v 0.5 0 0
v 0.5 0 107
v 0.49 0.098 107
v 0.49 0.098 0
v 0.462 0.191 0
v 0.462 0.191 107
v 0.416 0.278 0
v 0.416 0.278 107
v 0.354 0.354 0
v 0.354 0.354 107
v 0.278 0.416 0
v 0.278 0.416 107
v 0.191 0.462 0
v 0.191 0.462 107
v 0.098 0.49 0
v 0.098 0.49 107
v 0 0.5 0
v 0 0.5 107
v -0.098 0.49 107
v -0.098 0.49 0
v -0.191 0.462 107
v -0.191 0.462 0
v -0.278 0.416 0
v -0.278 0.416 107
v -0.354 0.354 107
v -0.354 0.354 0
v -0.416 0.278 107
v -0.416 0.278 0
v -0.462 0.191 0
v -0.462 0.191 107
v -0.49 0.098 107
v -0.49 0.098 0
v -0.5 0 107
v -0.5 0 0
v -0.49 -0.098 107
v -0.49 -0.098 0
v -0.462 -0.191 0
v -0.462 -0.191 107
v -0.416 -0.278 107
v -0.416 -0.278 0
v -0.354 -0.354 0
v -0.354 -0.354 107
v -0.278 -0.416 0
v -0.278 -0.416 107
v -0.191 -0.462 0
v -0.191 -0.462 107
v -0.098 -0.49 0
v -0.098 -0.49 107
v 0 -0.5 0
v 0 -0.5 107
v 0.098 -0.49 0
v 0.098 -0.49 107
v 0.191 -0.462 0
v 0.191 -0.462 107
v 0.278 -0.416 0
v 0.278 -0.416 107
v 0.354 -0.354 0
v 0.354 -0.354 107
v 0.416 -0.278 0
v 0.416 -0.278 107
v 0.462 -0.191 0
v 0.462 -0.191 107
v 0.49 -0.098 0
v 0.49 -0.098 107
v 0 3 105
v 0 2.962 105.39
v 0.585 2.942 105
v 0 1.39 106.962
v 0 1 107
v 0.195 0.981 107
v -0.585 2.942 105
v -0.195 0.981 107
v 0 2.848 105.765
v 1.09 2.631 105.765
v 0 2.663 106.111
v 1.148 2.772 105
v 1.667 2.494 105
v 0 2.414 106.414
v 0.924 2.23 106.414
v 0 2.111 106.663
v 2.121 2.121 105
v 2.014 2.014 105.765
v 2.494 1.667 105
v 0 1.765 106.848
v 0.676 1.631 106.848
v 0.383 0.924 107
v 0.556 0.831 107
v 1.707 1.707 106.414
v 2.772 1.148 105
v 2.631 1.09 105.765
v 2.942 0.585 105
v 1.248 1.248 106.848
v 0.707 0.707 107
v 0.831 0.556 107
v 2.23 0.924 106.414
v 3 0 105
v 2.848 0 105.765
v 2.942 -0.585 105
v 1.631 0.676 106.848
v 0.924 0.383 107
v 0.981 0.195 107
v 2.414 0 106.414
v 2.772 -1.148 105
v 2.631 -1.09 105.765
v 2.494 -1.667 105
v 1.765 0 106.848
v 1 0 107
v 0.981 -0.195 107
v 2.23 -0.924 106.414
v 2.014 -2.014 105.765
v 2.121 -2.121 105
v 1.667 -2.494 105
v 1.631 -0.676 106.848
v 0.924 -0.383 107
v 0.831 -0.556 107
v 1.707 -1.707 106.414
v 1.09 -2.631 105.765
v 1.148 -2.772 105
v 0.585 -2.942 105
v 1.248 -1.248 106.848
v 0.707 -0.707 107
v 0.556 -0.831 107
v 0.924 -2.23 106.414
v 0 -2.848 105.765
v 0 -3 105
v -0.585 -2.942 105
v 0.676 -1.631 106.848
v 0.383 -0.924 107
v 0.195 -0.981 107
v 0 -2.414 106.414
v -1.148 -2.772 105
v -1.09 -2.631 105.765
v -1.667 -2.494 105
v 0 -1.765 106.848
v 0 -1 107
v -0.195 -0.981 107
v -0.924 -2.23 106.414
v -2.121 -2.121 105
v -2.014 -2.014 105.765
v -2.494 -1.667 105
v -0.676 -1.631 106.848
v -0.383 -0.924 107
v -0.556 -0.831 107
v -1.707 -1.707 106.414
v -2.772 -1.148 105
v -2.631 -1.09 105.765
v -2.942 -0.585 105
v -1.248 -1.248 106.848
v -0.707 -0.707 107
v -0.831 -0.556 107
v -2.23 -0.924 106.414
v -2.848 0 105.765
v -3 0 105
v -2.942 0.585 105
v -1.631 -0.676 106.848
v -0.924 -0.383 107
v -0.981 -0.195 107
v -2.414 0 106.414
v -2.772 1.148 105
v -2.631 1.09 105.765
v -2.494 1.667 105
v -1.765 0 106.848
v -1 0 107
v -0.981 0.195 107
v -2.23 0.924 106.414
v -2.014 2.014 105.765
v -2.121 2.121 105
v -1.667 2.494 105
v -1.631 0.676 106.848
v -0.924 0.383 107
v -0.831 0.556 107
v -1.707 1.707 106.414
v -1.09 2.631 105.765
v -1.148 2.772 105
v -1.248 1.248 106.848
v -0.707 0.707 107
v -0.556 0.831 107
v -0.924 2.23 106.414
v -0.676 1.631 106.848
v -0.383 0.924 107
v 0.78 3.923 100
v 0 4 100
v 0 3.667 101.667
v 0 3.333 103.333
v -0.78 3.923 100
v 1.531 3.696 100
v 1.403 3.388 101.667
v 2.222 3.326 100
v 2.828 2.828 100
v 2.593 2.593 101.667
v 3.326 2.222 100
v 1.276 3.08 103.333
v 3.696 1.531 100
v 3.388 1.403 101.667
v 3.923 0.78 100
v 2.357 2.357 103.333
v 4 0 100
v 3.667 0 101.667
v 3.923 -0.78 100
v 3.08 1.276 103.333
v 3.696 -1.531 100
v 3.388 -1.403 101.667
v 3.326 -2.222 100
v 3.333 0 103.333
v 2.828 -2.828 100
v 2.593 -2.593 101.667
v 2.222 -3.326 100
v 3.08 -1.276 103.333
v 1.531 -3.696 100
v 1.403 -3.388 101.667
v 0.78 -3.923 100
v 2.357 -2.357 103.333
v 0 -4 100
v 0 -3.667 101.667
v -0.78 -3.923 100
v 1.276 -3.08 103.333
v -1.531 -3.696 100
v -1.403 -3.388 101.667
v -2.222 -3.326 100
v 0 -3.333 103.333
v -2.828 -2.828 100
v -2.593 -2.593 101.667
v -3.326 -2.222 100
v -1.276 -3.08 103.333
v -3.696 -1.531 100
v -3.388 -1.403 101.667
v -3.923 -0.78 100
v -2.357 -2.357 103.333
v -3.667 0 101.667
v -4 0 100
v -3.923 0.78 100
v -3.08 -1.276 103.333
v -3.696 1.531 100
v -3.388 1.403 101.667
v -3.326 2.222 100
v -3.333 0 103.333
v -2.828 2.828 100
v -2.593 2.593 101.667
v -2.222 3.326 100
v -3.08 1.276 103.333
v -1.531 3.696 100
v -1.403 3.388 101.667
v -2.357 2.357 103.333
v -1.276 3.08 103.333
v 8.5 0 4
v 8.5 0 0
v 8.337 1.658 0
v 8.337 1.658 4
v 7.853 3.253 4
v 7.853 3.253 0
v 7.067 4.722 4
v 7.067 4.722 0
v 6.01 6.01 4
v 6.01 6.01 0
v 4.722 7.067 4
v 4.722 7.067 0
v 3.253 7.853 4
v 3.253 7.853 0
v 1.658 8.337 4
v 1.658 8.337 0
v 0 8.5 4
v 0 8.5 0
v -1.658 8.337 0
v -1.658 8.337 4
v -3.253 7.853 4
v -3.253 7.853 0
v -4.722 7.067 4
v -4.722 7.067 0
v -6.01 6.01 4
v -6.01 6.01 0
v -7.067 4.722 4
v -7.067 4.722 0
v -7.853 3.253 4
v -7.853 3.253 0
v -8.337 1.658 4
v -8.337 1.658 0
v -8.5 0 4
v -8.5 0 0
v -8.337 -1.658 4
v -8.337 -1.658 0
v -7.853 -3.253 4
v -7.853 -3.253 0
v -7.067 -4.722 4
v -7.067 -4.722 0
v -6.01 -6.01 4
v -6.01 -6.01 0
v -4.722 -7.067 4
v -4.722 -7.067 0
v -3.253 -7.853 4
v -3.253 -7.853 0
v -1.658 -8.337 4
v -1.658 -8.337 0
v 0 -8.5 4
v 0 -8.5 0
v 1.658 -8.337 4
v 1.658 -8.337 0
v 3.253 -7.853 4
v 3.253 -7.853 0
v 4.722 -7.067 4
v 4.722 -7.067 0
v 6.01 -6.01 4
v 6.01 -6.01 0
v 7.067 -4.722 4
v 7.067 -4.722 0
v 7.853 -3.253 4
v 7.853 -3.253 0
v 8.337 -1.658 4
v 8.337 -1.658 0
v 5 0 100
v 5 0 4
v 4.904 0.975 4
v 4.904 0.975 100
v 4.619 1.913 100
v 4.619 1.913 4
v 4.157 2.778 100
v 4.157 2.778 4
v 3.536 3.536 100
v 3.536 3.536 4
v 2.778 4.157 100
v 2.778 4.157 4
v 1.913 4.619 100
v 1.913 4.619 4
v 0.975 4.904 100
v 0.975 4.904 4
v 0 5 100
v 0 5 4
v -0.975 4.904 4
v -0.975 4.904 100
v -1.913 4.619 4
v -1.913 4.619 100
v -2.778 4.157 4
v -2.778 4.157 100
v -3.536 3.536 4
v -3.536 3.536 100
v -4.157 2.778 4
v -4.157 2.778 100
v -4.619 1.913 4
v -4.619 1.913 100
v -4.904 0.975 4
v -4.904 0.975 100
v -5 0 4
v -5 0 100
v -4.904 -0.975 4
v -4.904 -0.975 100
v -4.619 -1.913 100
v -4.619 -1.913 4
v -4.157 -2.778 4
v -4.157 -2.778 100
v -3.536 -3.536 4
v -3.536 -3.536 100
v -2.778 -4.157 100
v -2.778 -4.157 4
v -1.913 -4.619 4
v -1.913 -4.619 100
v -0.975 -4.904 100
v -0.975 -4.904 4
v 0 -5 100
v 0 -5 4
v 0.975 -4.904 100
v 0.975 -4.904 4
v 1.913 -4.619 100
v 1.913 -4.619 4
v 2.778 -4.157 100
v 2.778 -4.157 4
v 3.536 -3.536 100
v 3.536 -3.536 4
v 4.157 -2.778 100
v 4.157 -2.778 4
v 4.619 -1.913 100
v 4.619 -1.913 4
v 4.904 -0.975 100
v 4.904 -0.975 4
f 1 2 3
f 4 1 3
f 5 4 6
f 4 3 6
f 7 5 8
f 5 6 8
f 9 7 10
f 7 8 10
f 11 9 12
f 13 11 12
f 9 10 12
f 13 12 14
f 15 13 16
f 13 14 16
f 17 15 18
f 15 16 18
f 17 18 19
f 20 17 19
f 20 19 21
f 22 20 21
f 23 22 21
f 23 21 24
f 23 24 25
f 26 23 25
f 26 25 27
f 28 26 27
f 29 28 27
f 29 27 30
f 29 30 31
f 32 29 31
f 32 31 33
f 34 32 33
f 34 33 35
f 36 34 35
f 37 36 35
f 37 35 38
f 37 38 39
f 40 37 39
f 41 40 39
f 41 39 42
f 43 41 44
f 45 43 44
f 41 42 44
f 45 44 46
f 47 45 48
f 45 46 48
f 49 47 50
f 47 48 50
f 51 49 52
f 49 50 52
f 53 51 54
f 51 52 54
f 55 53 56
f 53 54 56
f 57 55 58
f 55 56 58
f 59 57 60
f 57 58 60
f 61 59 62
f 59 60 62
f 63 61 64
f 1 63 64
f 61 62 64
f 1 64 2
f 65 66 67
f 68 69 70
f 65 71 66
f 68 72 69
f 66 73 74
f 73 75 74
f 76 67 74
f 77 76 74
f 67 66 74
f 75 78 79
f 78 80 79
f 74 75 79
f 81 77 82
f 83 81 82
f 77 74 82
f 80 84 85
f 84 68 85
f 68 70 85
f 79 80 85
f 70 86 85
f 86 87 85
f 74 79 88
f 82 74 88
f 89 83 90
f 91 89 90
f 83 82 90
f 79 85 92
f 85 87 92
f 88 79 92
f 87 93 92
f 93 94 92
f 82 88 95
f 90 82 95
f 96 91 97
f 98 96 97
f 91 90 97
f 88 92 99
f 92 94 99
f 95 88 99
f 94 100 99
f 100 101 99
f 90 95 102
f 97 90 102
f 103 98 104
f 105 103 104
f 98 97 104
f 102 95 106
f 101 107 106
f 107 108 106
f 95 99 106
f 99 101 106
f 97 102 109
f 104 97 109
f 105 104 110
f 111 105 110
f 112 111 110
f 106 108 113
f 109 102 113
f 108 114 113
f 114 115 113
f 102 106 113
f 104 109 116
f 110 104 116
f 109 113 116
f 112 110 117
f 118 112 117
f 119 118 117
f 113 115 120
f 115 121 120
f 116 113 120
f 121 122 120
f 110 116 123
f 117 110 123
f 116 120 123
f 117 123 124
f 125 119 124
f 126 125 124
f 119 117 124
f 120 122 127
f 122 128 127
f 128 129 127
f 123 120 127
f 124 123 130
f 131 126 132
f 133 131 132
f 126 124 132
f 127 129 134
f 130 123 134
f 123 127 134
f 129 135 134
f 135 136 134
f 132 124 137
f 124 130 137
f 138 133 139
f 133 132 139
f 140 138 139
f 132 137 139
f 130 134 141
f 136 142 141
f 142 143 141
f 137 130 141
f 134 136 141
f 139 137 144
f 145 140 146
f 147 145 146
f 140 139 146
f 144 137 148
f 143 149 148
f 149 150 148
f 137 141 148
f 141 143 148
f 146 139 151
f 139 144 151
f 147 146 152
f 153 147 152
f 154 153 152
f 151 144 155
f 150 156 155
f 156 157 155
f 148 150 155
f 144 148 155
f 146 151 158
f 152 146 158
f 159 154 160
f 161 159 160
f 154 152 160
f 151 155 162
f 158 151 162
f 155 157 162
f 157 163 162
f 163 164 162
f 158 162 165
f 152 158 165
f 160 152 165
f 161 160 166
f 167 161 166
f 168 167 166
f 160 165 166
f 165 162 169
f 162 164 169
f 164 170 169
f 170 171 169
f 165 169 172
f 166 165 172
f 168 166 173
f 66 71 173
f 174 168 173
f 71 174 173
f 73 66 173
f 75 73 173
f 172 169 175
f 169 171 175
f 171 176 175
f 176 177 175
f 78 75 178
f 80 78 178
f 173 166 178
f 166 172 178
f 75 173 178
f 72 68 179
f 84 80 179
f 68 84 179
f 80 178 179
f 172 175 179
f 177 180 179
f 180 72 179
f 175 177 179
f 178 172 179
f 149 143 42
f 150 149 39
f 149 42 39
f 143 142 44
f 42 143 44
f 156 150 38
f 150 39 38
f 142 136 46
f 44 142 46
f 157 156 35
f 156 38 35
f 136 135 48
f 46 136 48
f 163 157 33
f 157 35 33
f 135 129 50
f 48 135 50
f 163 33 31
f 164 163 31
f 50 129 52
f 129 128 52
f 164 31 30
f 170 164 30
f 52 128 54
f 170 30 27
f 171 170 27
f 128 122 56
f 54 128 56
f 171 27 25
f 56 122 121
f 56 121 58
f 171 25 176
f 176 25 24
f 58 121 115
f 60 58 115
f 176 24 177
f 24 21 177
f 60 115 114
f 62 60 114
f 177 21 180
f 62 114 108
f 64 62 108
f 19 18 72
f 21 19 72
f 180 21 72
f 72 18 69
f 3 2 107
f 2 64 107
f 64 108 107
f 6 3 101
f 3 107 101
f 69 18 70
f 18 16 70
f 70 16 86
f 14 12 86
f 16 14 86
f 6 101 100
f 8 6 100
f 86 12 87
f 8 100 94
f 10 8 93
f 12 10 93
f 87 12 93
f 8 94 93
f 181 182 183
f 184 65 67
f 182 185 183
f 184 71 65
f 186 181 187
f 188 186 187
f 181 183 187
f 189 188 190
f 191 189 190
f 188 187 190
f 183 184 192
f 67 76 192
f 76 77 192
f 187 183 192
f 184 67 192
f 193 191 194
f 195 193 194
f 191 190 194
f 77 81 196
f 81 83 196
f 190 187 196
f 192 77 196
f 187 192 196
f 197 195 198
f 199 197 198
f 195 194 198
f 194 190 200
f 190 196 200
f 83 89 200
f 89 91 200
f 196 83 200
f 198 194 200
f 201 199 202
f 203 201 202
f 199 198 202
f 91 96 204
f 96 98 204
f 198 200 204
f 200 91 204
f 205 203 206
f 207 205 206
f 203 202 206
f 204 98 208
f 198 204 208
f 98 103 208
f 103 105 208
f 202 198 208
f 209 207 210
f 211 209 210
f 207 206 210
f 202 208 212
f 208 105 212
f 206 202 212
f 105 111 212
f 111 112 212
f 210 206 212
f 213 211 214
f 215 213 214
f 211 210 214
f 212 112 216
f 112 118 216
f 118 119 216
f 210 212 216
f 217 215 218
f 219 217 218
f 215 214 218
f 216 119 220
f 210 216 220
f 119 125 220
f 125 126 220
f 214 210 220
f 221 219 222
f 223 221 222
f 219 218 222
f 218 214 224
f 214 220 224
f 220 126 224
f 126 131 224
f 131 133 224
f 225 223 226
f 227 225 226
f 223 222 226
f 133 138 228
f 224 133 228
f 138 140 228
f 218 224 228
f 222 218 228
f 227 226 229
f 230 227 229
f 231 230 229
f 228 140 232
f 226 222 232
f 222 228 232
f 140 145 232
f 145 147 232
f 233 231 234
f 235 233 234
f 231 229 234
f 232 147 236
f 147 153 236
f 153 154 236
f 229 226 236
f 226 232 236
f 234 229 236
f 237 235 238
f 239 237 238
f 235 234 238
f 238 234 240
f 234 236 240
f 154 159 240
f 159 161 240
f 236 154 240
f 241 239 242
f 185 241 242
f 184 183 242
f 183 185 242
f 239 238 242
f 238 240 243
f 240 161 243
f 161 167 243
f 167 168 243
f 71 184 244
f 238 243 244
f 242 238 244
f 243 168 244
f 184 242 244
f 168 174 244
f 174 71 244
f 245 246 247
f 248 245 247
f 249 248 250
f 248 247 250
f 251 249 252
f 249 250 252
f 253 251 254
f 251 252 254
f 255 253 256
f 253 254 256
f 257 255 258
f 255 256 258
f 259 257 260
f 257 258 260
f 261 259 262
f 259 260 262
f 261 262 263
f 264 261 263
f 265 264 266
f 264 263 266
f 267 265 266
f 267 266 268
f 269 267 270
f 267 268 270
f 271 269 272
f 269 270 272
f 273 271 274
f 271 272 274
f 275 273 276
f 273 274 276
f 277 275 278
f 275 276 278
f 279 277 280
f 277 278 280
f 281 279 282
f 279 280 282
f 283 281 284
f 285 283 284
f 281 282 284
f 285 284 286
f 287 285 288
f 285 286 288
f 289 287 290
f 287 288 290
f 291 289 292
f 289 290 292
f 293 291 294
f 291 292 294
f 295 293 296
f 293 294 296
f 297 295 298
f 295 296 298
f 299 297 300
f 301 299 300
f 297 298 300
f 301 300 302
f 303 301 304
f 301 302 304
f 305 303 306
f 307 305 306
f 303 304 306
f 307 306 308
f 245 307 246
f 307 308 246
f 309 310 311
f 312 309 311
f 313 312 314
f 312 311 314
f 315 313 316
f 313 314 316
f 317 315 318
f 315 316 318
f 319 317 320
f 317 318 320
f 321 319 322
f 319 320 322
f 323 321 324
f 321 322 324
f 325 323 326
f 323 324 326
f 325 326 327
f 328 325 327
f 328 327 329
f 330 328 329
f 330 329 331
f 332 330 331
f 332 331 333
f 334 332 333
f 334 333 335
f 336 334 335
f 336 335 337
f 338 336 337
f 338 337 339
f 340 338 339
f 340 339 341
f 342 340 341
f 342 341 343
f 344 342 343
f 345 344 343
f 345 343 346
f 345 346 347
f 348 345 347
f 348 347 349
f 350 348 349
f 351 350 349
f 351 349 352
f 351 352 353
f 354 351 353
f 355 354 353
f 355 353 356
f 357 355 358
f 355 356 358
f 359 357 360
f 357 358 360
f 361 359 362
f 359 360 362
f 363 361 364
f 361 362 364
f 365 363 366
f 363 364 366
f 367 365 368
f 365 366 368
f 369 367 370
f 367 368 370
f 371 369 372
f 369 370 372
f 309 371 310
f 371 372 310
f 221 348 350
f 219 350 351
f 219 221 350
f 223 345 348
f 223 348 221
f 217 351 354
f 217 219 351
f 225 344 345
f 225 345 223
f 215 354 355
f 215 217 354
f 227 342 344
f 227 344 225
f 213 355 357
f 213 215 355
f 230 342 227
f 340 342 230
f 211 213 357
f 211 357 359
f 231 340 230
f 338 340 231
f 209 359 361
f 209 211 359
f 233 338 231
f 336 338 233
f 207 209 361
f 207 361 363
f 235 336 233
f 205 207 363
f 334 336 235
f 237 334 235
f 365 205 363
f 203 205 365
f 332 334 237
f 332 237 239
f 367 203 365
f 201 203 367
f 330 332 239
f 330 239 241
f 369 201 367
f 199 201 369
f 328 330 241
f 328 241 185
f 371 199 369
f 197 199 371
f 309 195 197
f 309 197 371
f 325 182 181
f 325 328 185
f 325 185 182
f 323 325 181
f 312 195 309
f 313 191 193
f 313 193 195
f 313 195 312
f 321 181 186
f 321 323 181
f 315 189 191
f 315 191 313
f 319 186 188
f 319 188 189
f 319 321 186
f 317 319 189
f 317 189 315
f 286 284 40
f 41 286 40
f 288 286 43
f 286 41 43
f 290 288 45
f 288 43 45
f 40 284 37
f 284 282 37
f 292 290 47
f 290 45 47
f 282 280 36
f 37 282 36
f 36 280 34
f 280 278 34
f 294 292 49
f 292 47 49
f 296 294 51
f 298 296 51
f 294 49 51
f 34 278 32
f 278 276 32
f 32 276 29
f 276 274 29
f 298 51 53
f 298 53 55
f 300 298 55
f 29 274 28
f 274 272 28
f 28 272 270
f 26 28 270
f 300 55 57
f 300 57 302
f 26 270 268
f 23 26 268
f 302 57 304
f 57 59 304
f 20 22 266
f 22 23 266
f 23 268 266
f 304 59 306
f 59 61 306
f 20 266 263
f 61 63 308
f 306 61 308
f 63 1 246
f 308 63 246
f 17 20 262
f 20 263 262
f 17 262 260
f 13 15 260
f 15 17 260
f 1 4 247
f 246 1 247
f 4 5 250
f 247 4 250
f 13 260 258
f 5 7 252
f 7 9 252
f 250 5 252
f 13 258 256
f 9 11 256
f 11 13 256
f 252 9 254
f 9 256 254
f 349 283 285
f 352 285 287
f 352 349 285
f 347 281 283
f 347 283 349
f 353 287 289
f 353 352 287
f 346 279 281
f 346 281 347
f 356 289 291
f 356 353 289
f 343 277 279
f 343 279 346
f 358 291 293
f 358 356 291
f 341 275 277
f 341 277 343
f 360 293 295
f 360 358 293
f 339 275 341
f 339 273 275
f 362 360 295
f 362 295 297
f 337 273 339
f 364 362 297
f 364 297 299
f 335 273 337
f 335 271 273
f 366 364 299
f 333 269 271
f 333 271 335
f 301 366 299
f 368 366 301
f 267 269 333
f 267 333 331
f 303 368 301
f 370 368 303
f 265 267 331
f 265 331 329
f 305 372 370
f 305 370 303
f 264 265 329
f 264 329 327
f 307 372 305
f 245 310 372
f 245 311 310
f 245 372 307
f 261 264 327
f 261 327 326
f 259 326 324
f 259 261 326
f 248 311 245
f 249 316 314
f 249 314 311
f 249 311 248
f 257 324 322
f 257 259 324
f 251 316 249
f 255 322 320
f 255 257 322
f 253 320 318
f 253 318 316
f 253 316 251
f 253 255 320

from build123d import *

# Parameters (mm, degrees)
F0_R     = 8.5
F1_DEPTH = 4
F2_R     = 5
F3_DEPTH = 100
F8_R     = 0.5
F9_DEPTH = 112.7


with BuildPart() as f1:
    # F0 (on Top) → F1 (new body)
    with BuildSketch(Plane.XY):
        Circle(F0_R)
    extrude(amount=F1_DEPTH)

    # F2 (on Top) → F3 (join)
    with BuildSketch(Plane.XY):
        Circle(F2_R)
    extrude(amount=F3_DEPTH)

    # F4 (on Right) → F5 (revolve)
    with BuildSketch(Plane.YZ):
        Polygon((3, 105), (0, 105), (0, 100), (4, 100), align=None)
    revolve(axis=Axis((0, 0, 102.5), (0, 0, -1)))

    # F6 (on Right) → F7 (revolve)
    with BuildSketch(Plane.YZ):
        with BuildLine():
            Line((1, 107), (0, 107))
            Line((0, 107), (0, 105))
            Line((0, 105), (3, 105))
            ThreePointArc((3, 105), (2.414214, 106.414214), (1, 107))
        make_face()
    revolve(axis=Axis((0, 0, 106), (0, 0, -1)))

    # F8 (on face) → F9 (cut)
    with BuildSketch(Plane.XY.offset(107)):
        Circle(F8_R)
    extrude(amount=-F9_DEPTH, mode=Mode.SUBTRACT)


solid = f1.part
